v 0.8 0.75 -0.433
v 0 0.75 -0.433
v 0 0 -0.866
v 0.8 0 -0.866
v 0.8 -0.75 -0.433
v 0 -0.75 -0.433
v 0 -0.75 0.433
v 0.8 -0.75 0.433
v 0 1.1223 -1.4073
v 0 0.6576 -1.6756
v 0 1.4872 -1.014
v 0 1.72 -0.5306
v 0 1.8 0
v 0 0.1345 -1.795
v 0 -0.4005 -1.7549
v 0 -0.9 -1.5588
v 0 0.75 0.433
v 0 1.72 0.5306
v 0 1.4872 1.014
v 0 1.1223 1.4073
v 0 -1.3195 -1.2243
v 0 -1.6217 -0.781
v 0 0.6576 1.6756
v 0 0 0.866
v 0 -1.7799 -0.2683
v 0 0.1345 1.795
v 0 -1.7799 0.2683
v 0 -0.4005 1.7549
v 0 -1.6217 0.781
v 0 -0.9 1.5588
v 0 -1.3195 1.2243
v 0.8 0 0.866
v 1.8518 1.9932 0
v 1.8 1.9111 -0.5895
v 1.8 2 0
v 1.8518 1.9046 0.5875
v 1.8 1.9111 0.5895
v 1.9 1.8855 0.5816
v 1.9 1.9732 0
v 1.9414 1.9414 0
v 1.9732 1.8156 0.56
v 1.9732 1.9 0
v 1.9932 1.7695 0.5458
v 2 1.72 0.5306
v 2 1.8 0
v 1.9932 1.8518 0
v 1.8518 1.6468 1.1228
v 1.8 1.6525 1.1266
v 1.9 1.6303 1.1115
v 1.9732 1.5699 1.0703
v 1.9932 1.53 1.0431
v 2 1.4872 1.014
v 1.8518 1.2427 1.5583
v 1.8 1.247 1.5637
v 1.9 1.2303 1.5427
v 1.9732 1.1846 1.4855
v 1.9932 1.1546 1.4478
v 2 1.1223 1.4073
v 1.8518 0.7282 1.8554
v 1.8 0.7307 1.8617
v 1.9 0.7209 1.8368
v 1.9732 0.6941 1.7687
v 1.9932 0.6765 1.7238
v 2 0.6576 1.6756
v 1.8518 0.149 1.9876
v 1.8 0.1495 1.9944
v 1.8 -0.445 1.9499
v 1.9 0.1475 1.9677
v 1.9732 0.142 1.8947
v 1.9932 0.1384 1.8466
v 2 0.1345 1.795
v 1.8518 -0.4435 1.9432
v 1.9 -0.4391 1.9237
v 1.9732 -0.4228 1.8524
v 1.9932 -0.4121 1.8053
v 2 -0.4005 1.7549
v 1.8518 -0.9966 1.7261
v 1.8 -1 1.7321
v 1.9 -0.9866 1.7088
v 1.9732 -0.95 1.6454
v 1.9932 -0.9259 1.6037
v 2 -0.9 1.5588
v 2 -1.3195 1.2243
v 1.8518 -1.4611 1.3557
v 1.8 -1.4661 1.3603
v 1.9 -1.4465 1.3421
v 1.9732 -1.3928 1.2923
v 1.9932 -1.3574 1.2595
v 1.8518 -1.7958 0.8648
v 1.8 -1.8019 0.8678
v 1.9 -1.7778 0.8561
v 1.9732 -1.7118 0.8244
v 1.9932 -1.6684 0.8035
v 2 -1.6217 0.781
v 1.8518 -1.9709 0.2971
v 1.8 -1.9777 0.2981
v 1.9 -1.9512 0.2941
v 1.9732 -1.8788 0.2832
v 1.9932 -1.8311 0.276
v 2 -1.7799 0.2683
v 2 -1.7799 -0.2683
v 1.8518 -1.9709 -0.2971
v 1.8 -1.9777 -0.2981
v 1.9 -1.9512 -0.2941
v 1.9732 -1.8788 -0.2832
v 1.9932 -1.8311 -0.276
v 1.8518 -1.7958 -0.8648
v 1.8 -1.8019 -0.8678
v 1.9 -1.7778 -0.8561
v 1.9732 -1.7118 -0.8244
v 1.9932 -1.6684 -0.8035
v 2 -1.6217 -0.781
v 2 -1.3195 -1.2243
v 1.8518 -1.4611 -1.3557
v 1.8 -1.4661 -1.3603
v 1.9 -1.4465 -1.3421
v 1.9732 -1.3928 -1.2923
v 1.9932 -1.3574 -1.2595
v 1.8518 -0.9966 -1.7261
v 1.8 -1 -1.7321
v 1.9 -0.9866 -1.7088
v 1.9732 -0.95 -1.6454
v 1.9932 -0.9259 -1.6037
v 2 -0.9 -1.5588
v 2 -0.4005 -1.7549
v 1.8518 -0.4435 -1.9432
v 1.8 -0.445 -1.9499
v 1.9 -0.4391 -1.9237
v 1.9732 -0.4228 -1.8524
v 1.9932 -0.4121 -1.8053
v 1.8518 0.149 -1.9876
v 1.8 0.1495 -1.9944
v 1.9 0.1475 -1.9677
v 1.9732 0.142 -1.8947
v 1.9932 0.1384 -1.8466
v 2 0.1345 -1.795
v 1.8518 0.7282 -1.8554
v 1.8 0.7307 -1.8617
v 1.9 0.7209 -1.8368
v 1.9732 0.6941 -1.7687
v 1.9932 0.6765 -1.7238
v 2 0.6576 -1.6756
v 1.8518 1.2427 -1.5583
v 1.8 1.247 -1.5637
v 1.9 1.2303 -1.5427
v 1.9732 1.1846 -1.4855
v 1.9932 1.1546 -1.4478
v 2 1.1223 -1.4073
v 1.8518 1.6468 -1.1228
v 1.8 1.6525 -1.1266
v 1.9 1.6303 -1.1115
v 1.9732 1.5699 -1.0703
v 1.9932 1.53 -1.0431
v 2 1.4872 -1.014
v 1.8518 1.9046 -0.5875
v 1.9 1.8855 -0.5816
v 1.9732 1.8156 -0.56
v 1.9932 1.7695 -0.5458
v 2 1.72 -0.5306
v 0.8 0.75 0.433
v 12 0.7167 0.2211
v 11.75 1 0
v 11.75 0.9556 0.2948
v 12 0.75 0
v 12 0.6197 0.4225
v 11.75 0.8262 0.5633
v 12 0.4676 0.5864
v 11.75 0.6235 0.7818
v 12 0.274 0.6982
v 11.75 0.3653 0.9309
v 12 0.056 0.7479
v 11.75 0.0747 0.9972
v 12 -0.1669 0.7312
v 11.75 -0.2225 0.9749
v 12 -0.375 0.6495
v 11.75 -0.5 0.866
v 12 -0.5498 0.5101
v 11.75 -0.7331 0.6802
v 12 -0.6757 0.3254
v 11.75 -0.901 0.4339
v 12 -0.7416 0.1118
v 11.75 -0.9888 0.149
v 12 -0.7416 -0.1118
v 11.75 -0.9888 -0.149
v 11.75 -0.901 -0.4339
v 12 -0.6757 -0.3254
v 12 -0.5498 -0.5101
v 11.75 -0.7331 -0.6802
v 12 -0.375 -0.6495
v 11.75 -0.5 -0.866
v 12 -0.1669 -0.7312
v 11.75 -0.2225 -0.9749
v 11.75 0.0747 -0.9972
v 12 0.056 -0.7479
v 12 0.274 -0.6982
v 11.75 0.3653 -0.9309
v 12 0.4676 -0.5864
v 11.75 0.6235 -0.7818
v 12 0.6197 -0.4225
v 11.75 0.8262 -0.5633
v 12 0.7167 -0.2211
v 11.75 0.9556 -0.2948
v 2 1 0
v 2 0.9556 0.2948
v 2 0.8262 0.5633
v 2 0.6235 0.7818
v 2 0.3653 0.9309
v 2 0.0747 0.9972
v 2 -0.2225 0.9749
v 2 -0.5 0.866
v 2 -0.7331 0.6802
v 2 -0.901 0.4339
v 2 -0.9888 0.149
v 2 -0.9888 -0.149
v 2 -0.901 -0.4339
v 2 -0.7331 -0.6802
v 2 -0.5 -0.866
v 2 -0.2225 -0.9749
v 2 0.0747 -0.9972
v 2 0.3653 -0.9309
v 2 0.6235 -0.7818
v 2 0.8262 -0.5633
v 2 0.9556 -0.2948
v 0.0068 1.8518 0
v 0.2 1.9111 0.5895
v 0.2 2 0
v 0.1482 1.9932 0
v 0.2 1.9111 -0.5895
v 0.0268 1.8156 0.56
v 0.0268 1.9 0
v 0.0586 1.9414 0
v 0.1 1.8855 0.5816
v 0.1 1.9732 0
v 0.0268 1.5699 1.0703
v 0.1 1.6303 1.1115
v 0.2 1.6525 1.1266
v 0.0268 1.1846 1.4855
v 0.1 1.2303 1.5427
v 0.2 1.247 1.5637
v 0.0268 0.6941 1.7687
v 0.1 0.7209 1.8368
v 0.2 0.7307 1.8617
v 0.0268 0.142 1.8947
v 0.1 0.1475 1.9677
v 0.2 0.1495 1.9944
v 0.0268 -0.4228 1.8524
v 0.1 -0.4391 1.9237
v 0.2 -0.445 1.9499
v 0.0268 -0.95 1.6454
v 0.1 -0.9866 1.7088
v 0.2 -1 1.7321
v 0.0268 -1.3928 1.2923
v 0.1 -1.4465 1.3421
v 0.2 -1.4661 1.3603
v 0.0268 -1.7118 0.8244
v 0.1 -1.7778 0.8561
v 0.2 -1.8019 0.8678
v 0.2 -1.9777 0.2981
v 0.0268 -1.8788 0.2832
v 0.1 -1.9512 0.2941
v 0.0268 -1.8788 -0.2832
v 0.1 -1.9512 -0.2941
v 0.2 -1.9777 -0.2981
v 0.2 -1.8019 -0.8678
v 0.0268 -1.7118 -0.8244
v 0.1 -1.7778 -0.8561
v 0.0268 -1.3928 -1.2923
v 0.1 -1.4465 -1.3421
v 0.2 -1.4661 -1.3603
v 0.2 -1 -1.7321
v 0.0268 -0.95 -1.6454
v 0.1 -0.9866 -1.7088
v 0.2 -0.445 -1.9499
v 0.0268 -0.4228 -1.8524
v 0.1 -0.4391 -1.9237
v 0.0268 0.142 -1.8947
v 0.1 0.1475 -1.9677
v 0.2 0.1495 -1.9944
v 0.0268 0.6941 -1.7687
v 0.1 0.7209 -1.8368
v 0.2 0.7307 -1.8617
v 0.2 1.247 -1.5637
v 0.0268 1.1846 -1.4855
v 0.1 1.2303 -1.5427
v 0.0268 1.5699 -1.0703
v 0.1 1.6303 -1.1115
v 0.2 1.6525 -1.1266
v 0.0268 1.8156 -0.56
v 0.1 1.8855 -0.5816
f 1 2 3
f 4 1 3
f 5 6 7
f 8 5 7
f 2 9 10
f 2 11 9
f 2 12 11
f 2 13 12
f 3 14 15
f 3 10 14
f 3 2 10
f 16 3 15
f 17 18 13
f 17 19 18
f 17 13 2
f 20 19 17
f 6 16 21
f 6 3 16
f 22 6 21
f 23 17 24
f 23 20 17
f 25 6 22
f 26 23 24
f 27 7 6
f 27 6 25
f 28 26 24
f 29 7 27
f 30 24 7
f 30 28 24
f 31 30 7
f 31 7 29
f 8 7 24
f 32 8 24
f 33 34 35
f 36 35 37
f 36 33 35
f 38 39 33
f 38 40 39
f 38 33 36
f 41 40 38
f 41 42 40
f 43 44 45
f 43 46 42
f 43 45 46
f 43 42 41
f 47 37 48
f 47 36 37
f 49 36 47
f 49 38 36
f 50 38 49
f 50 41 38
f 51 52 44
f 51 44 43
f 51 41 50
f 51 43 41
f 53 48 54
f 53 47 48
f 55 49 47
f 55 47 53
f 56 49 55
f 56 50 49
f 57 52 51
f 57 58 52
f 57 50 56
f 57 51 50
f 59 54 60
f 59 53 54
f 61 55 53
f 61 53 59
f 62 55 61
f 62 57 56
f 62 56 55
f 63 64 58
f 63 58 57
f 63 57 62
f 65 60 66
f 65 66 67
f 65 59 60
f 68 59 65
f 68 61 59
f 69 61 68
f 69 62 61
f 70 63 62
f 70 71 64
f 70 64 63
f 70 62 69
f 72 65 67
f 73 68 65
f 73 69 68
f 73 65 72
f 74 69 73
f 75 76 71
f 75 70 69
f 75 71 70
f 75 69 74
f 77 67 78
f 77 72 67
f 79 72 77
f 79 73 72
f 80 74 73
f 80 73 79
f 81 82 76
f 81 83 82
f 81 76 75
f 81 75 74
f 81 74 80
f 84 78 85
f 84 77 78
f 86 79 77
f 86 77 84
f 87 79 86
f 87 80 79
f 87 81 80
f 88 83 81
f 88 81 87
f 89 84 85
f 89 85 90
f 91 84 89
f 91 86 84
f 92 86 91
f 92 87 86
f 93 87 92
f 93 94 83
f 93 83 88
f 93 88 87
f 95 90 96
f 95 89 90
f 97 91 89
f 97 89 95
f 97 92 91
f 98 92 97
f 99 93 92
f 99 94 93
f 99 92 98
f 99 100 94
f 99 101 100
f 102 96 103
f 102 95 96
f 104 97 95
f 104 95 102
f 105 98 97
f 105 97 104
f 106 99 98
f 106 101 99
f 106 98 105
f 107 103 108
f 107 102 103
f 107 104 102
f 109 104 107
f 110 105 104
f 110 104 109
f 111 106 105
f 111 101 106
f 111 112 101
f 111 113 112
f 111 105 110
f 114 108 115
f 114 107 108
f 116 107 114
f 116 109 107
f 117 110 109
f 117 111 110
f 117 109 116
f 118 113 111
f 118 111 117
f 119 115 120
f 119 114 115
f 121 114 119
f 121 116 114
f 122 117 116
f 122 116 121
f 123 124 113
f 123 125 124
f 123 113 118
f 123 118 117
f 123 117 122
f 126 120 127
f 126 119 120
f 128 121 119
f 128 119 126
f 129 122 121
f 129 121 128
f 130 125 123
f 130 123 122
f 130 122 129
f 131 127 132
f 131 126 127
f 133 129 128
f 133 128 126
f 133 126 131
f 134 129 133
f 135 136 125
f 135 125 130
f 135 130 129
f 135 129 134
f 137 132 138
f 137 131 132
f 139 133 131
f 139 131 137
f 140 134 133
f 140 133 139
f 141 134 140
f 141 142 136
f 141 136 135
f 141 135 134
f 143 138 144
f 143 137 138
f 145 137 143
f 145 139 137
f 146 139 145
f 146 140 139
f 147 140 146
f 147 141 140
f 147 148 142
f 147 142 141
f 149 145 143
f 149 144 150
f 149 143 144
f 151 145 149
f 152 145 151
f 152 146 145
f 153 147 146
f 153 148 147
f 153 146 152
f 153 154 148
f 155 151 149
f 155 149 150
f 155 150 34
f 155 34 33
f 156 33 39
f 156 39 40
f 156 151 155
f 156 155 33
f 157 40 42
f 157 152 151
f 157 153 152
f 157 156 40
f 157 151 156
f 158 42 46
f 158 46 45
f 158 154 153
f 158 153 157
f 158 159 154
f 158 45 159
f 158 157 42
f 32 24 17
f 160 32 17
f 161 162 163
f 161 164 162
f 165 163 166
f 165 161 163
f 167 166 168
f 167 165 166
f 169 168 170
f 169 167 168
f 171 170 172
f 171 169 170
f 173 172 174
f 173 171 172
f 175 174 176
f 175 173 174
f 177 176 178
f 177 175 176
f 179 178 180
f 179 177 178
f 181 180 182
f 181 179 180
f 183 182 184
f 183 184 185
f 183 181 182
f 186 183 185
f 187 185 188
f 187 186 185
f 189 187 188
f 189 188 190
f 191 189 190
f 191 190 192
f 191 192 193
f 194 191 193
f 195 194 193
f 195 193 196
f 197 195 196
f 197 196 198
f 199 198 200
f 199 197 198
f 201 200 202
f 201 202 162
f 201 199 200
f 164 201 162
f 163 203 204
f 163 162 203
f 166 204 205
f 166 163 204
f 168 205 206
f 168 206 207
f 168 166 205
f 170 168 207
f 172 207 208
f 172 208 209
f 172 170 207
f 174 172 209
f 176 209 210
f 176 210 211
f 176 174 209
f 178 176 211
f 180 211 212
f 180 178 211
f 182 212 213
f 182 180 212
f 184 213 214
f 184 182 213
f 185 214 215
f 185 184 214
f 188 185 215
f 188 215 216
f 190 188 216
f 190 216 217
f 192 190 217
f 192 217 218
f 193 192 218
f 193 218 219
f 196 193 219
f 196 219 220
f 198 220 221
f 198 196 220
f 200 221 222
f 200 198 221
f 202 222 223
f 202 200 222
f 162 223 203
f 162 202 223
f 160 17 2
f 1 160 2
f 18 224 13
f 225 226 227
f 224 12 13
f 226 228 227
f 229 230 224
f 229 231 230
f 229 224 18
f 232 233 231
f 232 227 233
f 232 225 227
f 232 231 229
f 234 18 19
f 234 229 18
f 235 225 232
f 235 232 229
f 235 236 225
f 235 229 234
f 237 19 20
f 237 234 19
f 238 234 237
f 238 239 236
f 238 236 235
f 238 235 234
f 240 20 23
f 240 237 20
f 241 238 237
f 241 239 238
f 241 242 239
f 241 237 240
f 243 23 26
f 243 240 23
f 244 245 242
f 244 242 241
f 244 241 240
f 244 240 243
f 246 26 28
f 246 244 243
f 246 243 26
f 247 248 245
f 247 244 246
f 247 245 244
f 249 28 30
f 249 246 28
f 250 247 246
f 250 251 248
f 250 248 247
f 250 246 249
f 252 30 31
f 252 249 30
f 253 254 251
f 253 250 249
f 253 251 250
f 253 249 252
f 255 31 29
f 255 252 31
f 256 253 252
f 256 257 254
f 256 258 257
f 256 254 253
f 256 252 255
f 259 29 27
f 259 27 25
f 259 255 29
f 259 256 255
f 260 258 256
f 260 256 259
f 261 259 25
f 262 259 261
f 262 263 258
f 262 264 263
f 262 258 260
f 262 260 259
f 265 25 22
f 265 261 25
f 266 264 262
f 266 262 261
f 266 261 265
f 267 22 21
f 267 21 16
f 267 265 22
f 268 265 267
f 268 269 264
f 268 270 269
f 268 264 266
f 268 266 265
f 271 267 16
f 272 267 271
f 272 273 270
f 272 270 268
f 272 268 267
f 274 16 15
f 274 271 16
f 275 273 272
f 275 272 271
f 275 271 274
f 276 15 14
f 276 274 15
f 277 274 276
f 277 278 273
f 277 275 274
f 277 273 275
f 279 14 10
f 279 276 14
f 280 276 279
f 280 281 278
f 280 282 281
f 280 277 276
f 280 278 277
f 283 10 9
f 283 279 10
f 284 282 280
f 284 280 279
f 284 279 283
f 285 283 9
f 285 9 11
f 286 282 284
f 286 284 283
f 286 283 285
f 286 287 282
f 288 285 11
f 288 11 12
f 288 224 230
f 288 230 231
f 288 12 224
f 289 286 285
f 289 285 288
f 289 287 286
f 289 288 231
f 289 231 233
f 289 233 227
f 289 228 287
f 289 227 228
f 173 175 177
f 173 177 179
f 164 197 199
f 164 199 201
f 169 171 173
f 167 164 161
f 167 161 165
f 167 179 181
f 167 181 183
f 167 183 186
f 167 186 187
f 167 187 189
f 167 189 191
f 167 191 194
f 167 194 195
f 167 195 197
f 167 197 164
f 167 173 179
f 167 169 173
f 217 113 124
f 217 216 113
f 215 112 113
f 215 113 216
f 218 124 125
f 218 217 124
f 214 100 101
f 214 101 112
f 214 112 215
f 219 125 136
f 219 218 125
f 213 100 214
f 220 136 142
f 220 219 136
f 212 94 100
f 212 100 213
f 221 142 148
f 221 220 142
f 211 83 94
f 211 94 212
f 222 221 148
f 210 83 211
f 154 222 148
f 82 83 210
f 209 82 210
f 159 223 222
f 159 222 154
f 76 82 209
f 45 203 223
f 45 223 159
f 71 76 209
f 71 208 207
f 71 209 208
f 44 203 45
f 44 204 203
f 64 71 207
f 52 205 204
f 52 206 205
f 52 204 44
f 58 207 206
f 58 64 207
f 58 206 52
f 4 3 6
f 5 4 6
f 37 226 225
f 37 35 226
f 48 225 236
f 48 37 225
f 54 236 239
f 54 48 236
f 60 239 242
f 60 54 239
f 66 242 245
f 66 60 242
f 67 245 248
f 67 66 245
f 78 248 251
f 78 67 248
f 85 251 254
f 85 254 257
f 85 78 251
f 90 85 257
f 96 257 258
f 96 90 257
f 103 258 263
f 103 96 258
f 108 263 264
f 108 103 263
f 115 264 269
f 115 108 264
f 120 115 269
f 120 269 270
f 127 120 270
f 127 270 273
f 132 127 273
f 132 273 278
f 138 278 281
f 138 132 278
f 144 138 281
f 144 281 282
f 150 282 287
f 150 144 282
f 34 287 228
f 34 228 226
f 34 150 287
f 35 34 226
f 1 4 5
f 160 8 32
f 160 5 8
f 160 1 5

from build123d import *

# Parameters (mm, degrees)
CUT_EXTRUDE1_DEPTH = 0.8


with BuildPart() as part:
    # Sketch2 → Revolve1 (revolve)
    with BuildSketch(Plane.XY):
        with BuildLine():
            Line((0, 0), (0, 1.8))
            ThreePointArc((0, 1.8), (0.058578644, 1.941421356), (0.2, 2))
            Line((0.2, 2), (1.8, 2))
            ThreePointArc((1.8, 2), (1.941421356, 1.941421356), (2, 1.8))
            Line((2, 1.8), (2, 1))
            Line((2, 1), (11.75, 1))
            Line((11.75, 1), (12, 0.75))
            Line((12, 0.75), (12, 0))
            Line((12, 0), (0, 0))
        make_face()
    revolve(axis=Axis((-2.281841559, 0, 0), (1, 0, 0)))

    # Sketch3 → Cut-Extrude1 (cut)
    with BuildSketch(Plane.ZY):
        Polygon((0.433012702, -0.75), (0.866025404, 0), (0.433012702, 0.75), (-0.433012702, 0.75), (-0.866025404, 0), (-0.433012702, -0.75), align=None)
    extrude(amount=-CUT_EXTRUDE1_DEPTH, mode=Mode.SUBTRACT)


solid = part.part
